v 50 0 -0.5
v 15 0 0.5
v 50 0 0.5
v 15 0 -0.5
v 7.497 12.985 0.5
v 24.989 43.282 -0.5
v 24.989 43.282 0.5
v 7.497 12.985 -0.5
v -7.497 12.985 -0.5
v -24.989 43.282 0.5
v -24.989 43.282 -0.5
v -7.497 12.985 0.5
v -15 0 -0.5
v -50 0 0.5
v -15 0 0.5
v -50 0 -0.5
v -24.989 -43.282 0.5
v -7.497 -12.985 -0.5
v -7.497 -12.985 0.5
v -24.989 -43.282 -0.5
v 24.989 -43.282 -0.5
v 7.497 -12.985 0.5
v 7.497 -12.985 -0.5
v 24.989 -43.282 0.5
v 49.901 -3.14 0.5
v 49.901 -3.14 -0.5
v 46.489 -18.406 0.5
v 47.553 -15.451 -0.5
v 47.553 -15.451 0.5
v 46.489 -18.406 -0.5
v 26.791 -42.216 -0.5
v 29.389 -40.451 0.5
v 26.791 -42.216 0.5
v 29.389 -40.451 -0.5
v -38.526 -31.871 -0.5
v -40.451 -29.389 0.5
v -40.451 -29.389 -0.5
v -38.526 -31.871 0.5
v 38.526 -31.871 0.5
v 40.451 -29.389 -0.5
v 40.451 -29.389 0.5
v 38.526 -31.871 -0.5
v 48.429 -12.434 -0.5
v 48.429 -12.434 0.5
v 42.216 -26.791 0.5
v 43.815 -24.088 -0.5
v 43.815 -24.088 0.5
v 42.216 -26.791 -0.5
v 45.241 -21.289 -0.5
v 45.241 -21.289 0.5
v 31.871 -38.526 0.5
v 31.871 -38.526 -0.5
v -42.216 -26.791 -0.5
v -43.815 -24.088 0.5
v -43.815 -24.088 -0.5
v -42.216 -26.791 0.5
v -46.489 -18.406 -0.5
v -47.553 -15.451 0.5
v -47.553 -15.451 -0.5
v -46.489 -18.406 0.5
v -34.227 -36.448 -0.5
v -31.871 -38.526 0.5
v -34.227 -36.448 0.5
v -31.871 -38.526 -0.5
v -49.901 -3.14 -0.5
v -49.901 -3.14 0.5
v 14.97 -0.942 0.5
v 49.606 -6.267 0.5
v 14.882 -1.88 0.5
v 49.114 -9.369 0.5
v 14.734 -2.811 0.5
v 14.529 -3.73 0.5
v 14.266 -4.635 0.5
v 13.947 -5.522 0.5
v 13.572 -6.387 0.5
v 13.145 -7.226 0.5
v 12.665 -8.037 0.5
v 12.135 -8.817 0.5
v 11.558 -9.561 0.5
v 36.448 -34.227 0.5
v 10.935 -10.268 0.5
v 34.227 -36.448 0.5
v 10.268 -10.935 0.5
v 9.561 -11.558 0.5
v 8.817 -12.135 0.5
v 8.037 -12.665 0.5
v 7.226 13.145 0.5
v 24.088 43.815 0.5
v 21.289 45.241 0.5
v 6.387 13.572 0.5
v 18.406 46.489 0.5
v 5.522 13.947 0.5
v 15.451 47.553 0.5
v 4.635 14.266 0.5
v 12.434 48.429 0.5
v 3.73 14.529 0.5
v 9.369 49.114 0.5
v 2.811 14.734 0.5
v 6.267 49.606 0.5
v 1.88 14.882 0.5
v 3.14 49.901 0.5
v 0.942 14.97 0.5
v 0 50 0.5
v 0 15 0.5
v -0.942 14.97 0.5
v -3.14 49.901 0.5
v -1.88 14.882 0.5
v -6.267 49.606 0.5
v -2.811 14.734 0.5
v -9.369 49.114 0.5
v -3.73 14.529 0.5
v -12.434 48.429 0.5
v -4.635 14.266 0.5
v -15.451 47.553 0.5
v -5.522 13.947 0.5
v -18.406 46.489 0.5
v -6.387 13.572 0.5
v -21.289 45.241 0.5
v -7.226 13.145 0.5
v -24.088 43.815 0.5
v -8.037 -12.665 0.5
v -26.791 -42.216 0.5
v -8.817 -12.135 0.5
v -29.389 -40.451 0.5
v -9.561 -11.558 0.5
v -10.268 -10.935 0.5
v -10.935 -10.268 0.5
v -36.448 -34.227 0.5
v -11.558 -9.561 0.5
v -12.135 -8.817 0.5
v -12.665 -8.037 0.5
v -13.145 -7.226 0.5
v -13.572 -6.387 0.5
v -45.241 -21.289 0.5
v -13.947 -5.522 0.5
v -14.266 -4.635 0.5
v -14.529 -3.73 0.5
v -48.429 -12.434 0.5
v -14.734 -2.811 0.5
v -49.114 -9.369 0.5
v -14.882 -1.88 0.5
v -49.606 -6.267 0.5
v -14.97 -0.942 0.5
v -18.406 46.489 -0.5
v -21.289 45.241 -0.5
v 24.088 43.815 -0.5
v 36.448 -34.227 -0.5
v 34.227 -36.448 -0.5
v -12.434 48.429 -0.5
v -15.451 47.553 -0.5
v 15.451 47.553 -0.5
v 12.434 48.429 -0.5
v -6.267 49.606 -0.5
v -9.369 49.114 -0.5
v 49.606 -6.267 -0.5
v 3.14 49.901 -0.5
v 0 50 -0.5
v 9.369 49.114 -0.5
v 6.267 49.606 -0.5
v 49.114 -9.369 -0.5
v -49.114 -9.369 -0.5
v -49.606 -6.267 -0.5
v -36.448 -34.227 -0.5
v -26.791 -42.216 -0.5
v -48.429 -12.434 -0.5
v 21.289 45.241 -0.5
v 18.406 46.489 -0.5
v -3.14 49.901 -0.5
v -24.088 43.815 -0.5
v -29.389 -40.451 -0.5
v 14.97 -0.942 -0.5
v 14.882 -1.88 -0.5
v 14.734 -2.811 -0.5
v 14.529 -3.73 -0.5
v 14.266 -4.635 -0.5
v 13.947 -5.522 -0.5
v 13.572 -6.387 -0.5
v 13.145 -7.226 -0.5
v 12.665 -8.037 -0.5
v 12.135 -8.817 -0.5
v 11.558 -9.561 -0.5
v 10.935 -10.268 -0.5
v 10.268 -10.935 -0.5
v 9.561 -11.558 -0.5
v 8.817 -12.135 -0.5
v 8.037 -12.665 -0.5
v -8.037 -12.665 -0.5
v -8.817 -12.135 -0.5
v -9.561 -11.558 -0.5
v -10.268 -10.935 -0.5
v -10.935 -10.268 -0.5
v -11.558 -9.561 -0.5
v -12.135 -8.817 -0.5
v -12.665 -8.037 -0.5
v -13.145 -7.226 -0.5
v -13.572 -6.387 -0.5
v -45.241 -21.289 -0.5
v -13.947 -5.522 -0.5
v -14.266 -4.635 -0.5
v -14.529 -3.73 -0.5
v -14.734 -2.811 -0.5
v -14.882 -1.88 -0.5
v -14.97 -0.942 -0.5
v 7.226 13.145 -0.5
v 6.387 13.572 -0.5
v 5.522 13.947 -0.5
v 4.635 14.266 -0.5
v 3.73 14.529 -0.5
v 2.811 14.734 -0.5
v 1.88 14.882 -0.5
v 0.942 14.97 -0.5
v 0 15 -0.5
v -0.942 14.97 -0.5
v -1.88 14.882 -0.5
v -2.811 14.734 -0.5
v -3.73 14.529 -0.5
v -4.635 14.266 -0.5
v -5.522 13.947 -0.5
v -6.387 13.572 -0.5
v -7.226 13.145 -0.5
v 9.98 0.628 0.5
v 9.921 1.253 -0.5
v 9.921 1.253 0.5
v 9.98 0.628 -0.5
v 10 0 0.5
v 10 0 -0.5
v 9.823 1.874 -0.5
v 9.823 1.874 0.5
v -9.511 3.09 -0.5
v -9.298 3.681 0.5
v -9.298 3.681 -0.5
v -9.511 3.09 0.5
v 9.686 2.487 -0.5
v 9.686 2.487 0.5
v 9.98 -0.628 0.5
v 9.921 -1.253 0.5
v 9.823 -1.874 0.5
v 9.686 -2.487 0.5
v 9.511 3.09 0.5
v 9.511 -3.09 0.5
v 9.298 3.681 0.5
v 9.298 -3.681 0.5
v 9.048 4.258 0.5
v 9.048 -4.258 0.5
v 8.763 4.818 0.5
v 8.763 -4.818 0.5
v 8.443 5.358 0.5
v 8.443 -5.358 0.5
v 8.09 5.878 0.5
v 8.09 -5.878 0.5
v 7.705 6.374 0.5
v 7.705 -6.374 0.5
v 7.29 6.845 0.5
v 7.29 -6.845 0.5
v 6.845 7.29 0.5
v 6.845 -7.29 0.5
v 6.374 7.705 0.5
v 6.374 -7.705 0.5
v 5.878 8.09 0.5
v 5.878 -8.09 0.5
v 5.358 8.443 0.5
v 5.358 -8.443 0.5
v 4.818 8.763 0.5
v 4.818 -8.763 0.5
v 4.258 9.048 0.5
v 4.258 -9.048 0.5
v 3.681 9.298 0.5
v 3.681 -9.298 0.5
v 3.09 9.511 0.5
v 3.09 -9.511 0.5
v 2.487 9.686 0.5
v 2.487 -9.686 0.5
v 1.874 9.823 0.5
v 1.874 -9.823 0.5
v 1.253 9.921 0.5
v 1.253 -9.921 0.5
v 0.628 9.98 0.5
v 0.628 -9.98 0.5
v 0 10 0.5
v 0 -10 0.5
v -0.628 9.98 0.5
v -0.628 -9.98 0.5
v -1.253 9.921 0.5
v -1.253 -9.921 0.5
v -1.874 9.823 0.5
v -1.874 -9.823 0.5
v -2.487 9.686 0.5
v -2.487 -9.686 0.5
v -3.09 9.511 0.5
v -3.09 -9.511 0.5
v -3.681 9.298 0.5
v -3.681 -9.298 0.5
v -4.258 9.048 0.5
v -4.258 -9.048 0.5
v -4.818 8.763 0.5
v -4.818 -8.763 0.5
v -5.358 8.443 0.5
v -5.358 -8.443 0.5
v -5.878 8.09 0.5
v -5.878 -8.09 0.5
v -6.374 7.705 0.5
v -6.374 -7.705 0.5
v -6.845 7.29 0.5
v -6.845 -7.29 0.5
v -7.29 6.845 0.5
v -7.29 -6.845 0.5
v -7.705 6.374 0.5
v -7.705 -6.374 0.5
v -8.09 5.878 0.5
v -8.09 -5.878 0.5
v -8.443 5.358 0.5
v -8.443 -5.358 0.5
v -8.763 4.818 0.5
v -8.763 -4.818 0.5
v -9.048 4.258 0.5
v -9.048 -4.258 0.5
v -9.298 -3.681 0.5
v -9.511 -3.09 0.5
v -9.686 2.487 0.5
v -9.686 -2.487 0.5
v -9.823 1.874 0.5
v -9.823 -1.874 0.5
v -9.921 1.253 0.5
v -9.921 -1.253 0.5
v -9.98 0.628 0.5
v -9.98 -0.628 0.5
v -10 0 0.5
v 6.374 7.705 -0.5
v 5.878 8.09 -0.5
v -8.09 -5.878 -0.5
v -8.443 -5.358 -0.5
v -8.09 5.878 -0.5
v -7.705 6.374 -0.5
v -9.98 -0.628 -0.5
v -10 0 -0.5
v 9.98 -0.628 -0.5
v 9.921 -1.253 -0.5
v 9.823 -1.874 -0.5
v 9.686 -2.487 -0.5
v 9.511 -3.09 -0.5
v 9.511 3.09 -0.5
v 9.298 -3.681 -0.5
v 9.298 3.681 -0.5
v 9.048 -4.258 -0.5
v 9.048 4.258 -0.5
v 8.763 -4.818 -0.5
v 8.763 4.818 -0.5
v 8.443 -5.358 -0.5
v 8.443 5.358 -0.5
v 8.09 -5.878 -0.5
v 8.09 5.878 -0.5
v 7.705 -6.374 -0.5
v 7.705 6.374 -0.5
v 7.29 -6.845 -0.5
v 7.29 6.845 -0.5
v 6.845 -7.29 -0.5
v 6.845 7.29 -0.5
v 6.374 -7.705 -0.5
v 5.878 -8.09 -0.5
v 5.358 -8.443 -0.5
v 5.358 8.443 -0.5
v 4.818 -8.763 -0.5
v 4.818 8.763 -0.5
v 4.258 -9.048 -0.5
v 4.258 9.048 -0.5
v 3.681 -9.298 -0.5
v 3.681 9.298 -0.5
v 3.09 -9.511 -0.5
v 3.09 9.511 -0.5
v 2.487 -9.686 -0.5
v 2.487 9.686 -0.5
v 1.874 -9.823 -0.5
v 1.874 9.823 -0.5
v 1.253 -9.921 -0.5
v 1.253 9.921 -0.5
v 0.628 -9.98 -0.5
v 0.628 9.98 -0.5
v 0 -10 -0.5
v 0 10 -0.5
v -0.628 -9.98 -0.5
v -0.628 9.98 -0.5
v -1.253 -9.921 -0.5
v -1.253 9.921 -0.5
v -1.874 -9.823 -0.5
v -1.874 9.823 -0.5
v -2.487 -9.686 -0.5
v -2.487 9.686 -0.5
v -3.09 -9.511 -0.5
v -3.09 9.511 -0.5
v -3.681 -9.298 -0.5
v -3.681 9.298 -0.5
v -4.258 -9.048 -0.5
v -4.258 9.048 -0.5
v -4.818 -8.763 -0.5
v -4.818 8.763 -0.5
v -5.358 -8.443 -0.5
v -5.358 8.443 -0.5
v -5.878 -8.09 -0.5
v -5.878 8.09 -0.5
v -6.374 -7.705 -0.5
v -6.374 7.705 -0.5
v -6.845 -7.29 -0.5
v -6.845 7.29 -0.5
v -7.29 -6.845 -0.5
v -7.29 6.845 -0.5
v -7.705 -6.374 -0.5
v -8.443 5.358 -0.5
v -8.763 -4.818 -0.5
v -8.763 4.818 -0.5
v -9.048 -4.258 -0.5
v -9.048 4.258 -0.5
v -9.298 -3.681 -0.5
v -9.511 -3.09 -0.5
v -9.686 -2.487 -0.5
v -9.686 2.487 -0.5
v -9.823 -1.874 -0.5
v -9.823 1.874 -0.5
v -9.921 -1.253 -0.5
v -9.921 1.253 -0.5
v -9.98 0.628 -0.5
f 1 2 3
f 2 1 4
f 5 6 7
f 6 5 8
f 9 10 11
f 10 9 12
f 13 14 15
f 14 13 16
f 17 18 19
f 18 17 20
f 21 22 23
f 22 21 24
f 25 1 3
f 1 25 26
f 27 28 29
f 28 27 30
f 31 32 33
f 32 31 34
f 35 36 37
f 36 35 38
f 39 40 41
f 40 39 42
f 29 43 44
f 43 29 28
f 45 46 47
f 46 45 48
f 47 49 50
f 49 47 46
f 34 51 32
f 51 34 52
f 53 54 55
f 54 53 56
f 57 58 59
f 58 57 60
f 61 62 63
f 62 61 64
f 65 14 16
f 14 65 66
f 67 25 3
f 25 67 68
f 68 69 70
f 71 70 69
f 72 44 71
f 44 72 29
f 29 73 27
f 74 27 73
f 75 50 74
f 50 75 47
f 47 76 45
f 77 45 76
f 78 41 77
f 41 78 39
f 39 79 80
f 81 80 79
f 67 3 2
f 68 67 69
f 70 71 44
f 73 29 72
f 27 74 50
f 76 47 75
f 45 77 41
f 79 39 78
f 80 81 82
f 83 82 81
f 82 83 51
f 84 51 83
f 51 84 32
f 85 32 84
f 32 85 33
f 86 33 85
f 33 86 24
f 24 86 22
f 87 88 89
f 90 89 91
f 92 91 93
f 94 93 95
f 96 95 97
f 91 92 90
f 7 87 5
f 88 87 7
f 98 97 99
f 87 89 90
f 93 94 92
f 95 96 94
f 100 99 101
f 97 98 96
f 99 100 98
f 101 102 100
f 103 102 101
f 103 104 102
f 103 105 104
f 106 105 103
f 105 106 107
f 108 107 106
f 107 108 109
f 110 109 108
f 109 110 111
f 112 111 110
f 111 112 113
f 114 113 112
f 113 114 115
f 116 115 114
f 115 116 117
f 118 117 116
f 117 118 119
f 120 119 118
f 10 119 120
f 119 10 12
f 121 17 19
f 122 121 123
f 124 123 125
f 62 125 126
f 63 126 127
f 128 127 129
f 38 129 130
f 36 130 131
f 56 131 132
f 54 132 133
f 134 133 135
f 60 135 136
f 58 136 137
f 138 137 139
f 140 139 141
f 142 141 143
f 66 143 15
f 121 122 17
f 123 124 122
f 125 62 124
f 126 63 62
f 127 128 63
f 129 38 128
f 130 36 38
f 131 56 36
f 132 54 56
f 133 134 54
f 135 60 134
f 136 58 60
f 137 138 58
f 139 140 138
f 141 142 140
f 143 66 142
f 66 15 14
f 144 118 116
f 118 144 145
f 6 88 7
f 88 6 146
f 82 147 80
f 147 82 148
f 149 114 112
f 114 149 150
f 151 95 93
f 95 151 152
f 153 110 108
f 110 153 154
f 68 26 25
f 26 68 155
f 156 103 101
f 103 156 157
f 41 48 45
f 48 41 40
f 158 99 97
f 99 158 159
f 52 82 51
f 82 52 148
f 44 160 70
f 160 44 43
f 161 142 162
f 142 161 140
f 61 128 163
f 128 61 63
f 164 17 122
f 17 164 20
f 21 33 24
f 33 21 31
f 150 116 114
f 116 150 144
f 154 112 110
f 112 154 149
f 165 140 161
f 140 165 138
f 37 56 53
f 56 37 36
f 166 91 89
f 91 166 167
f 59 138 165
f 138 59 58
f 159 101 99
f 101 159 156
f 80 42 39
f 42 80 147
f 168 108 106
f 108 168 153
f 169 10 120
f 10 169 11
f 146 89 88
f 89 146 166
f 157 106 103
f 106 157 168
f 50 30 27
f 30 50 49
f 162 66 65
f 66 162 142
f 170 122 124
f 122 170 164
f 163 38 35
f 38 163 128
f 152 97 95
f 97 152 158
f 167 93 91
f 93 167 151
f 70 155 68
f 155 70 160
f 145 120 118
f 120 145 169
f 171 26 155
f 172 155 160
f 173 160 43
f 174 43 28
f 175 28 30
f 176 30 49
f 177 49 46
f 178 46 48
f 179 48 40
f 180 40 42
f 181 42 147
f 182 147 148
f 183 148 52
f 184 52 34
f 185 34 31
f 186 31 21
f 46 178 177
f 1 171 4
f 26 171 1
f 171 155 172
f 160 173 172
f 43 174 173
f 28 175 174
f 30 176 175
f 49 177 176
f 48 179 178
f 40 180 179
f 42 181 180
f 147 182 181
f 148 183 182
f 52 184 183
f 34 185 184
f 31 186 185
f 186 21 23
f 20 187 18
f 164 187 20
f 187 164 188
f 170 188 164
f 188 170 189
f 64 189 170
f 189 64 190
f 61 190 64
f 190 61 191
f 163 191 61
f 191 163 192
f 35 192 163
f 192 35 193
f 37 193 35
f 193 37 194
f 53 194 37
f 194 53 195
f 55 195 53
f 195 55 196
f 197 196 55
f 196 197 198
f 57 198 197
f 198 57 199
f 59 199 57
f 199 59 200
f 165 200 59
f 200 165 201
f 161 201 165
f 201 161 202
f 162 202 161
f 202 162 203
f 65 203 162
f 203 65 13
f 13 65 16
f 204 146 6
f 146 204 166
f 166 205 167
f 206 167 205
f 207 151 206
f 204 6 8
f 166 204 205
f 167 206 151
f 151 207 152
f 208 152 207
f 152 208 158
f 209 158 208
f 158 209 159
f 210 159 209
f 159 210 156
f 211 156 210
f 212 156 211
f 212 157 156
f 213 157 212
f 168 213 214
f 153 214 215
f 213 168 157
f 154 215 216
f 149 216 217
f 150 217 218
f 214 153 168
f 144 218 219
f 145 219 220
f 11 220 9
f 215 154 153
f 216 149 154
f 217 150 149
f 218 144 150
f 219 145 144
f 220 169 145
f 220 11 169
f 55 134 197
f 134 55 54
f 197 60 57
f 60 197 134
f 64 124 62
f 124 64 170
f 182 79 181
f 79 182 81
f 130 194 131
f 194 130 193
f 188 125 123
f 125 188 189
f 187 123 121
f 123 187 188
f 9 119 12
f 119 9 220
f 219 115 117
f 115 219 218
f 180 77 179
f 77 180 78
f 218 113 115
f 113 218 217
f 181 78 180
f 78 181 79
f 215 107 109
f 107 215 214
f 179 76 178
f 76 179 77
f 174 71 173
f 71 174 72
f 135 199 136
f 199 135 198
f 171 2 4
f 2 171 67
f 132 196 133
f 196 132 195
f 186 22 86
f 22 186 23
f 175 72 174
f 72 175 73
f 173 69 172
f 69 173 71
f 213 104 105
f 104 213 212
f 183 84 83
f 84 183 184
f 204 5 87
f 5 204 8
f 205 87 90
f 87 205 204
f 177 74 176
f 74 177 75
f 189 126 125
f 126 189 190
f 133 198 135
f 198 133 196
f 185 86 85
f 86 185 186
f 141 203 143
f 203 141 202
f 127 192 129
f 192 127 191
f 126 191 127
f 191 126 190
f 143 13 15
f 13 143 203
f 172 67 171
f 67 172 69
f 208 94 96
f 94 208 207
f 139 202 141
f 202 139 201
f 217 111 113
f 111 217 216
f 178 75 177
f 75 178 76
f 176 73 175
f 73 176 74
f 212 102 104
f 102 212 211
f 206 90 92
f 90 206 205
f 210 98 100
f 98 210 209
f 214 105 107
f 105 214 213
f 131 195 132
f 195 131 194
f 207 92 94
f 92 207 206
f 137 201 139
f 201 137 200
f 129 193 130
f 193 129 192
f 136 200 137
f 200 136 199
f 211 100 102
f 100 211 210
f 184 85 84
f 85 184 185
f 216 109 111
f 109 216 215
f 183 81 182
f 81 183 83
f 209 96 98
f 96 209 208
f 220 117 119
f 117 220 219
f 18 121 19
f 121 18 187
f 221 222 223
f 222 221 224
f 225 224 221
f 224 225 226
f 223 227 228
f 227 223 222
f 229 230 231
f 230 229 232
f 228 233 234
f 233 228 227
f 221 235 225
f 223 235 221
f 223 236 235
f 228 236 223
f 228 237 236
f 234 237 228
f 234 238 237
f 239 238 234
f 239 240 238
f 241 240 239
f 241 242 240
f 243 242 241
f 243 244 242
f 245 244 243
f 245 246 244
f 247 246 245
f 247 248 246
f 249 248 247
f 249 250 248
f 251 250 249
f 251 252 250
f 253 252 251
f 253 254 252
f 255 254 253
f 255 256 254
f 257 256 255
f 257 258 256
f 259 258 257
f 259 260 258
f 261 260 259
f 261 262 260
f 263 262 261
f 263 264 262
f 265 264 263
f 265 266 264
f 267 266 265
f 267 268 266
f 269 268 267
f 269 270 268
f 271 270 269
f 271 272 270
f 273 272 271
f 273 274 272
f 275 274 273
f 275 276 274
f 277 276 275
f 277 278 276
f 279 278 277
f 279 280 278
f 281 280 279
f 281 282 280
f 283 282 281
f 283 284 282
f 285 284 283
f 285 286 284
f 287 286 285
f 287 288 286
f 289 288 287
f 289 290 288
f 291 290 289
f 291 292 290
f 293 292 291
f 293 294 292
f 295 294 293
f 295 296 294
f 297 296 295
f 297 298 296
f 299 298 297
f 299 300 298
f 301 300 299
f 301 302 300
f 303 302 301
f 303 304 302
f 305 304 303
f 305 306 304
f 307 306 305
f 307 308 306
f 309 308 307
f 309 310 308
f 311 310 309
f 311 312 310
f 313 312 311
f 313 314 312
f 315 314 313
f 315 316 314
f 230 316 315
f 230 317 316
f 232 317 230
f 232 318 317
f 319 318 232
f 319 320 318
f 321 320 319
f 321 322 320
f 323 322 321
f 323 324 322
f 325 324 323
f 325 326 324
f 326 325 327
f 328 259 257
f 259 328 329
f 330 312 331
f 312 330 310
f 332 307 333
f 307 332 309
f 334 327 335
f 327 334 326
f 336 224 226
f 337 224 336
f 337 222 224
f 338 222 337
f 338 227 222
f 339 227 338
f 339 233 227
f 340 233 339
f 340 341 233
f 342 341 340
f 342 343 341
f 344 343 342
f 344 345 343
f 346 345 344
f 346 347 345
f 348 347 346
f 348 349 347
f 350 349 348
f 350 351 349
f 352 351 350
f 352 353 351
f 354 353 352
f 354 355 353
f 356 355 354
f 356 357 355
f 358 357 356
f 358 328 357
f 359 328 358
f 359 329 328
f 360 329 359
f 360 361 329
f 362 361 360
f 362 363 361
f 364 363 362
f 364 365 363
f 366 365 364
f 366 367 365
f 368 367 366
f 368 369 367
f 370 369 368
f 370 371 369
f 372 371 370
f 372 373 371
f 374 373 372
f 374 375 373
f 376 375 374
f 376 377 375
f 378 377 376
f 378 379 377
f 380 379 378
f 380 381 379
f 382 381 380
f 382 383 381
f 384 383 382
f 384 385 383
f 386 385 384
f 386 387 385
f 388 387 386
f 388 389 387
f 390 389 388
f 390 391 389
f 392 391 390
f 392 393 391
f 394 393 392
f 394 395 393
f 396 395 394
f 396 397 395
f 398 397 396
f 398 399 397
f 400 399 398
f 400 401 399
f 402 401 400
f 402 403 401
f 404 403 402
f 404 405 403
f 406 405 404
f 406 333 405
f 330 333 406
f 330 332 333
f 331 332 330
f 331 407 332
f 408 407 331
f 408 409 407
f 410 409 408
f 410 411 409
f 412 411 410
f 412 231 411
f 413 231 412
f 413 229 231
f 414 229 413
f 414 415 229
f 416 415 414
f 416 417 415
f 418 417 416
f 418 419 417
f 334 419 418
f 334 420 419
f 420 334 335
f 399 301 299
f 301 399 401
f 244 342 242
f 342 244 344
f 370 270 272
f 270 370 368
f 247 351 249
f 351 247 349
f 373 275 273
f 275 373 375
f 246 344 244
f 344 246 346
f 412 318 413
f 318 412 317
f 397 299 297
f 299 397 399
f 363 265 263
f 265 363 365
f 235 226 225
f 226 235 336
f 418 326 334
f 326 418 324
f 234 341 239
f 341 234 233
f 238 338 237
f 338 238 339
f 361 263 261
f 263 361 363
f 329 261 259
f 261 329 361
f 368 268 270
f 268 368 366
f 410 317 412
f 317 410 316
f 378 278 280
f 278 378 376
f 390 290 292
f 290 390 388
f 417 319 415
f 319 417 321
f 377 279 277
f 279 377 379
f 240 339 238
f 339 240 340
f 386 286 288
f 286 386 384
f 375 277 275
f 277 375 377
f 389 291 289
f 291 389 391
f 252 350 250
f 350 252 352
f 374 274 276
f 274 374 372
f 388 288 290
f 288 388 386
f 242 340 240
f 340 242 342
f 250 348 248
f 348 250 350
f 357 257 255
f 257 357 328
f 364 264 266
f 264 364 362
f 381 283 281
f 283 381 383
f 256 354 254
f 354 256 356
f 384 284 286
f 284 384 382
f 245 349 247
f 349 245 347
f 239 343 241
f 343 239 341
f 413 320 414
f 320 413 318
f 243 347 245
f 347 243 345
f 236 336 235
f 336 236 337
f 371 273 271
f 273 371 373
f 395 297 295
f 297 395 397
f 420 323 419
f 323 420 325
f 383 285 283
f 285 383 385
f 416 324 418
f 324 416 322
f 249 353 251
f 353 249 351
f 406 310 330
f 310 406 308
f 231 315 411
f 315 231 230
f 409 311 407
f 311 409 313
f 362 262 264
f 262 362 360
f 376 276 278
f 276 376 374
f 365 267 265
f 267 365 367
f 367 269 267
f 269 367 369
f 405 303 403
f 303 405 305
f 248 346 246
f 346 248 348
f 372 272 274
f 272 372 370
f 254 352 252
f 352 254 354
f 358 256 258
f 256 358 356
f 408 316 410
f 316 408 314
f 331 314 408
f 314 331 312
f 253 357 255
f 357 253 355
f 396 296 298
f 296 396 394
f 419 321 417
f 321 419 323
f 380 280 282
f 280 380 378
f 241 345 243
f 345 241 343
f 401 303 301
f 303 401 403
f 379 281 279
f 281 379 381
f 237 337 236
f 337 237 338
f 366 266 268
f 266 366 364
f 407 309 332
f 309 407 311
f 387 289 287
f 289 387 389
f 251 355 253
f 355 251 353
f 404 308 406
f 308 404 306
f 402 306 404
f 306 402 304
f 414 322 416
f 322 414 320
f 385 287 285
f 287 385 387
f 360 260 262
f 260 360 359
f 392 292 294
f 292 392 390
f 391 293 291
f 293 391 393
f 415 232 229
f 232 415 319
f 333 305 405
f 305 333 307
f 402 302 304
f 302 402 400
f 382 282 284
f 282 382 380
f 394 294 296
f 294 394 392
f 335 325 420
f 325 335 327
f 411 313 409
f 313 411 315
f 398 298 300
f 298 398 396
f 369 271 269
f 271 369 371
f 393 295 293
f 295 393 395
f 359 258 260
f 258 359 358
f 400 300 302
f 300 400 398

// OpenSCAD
// [FL_INDEX: keywords="openscad, 3d_parametric, Radioactive_Trefoil__OpenSCAD, csg_solid" | COT="Parametric OpenSCAD design from 3DCodeverse"]
// Title: Radioactive Trefoil (OpenSCAD)

/* Coded by Ben Rockhold */

/*	Customizer Variables	*/
OuterRadius = 50;
TrefoilHeight = 1;
//The ISO standard calls for a Trefoil with an inner circle of r, and three blades of inner radius 1.5*r and outer of 5*r, separated by 60 degrees. However, I have made this ratio editable here. I don't recommend changing them.
InnerRatio = 1.5;
OuterRatio = 5;
ResolutionMultiplier = 10;

Trefoil(OuterRadius,TrefoilHeight,InnerRatio,OuterRatio,ResolutionMultiplier);
//Animation is fun, but... kinda broken, and pointless.
//rotate(a=$t*100000){Trefoil(OuterRadius,TrefoilHeight,Ratio,ResolutionMultiplier);}

module Trefoil(outradius,height,inRatio,outRatio,rez){
	inradius = outradius/outRatio;
	union(){
		cylinder(r=inradius,height,center=true, $fn=inradius*rez);
		difference(){
			cylinder(r=outradius,height,center=true, $fn=inradius*rez);
			cylinder(r=inradius*inRatio,height*2,center=true, $fn=inradius*rez);
			for(i=[0:3]){
				rotate(a = i*120) {
				linear_extrude(height=height+1, center=true)
				polygon(points=[[0,0],[2*outradius,0],[(2*outradius)*cos(60),(2*outradius)*sin(60)]], paths=[[0,1,2]]);
				}
			}
		}
	}
}
